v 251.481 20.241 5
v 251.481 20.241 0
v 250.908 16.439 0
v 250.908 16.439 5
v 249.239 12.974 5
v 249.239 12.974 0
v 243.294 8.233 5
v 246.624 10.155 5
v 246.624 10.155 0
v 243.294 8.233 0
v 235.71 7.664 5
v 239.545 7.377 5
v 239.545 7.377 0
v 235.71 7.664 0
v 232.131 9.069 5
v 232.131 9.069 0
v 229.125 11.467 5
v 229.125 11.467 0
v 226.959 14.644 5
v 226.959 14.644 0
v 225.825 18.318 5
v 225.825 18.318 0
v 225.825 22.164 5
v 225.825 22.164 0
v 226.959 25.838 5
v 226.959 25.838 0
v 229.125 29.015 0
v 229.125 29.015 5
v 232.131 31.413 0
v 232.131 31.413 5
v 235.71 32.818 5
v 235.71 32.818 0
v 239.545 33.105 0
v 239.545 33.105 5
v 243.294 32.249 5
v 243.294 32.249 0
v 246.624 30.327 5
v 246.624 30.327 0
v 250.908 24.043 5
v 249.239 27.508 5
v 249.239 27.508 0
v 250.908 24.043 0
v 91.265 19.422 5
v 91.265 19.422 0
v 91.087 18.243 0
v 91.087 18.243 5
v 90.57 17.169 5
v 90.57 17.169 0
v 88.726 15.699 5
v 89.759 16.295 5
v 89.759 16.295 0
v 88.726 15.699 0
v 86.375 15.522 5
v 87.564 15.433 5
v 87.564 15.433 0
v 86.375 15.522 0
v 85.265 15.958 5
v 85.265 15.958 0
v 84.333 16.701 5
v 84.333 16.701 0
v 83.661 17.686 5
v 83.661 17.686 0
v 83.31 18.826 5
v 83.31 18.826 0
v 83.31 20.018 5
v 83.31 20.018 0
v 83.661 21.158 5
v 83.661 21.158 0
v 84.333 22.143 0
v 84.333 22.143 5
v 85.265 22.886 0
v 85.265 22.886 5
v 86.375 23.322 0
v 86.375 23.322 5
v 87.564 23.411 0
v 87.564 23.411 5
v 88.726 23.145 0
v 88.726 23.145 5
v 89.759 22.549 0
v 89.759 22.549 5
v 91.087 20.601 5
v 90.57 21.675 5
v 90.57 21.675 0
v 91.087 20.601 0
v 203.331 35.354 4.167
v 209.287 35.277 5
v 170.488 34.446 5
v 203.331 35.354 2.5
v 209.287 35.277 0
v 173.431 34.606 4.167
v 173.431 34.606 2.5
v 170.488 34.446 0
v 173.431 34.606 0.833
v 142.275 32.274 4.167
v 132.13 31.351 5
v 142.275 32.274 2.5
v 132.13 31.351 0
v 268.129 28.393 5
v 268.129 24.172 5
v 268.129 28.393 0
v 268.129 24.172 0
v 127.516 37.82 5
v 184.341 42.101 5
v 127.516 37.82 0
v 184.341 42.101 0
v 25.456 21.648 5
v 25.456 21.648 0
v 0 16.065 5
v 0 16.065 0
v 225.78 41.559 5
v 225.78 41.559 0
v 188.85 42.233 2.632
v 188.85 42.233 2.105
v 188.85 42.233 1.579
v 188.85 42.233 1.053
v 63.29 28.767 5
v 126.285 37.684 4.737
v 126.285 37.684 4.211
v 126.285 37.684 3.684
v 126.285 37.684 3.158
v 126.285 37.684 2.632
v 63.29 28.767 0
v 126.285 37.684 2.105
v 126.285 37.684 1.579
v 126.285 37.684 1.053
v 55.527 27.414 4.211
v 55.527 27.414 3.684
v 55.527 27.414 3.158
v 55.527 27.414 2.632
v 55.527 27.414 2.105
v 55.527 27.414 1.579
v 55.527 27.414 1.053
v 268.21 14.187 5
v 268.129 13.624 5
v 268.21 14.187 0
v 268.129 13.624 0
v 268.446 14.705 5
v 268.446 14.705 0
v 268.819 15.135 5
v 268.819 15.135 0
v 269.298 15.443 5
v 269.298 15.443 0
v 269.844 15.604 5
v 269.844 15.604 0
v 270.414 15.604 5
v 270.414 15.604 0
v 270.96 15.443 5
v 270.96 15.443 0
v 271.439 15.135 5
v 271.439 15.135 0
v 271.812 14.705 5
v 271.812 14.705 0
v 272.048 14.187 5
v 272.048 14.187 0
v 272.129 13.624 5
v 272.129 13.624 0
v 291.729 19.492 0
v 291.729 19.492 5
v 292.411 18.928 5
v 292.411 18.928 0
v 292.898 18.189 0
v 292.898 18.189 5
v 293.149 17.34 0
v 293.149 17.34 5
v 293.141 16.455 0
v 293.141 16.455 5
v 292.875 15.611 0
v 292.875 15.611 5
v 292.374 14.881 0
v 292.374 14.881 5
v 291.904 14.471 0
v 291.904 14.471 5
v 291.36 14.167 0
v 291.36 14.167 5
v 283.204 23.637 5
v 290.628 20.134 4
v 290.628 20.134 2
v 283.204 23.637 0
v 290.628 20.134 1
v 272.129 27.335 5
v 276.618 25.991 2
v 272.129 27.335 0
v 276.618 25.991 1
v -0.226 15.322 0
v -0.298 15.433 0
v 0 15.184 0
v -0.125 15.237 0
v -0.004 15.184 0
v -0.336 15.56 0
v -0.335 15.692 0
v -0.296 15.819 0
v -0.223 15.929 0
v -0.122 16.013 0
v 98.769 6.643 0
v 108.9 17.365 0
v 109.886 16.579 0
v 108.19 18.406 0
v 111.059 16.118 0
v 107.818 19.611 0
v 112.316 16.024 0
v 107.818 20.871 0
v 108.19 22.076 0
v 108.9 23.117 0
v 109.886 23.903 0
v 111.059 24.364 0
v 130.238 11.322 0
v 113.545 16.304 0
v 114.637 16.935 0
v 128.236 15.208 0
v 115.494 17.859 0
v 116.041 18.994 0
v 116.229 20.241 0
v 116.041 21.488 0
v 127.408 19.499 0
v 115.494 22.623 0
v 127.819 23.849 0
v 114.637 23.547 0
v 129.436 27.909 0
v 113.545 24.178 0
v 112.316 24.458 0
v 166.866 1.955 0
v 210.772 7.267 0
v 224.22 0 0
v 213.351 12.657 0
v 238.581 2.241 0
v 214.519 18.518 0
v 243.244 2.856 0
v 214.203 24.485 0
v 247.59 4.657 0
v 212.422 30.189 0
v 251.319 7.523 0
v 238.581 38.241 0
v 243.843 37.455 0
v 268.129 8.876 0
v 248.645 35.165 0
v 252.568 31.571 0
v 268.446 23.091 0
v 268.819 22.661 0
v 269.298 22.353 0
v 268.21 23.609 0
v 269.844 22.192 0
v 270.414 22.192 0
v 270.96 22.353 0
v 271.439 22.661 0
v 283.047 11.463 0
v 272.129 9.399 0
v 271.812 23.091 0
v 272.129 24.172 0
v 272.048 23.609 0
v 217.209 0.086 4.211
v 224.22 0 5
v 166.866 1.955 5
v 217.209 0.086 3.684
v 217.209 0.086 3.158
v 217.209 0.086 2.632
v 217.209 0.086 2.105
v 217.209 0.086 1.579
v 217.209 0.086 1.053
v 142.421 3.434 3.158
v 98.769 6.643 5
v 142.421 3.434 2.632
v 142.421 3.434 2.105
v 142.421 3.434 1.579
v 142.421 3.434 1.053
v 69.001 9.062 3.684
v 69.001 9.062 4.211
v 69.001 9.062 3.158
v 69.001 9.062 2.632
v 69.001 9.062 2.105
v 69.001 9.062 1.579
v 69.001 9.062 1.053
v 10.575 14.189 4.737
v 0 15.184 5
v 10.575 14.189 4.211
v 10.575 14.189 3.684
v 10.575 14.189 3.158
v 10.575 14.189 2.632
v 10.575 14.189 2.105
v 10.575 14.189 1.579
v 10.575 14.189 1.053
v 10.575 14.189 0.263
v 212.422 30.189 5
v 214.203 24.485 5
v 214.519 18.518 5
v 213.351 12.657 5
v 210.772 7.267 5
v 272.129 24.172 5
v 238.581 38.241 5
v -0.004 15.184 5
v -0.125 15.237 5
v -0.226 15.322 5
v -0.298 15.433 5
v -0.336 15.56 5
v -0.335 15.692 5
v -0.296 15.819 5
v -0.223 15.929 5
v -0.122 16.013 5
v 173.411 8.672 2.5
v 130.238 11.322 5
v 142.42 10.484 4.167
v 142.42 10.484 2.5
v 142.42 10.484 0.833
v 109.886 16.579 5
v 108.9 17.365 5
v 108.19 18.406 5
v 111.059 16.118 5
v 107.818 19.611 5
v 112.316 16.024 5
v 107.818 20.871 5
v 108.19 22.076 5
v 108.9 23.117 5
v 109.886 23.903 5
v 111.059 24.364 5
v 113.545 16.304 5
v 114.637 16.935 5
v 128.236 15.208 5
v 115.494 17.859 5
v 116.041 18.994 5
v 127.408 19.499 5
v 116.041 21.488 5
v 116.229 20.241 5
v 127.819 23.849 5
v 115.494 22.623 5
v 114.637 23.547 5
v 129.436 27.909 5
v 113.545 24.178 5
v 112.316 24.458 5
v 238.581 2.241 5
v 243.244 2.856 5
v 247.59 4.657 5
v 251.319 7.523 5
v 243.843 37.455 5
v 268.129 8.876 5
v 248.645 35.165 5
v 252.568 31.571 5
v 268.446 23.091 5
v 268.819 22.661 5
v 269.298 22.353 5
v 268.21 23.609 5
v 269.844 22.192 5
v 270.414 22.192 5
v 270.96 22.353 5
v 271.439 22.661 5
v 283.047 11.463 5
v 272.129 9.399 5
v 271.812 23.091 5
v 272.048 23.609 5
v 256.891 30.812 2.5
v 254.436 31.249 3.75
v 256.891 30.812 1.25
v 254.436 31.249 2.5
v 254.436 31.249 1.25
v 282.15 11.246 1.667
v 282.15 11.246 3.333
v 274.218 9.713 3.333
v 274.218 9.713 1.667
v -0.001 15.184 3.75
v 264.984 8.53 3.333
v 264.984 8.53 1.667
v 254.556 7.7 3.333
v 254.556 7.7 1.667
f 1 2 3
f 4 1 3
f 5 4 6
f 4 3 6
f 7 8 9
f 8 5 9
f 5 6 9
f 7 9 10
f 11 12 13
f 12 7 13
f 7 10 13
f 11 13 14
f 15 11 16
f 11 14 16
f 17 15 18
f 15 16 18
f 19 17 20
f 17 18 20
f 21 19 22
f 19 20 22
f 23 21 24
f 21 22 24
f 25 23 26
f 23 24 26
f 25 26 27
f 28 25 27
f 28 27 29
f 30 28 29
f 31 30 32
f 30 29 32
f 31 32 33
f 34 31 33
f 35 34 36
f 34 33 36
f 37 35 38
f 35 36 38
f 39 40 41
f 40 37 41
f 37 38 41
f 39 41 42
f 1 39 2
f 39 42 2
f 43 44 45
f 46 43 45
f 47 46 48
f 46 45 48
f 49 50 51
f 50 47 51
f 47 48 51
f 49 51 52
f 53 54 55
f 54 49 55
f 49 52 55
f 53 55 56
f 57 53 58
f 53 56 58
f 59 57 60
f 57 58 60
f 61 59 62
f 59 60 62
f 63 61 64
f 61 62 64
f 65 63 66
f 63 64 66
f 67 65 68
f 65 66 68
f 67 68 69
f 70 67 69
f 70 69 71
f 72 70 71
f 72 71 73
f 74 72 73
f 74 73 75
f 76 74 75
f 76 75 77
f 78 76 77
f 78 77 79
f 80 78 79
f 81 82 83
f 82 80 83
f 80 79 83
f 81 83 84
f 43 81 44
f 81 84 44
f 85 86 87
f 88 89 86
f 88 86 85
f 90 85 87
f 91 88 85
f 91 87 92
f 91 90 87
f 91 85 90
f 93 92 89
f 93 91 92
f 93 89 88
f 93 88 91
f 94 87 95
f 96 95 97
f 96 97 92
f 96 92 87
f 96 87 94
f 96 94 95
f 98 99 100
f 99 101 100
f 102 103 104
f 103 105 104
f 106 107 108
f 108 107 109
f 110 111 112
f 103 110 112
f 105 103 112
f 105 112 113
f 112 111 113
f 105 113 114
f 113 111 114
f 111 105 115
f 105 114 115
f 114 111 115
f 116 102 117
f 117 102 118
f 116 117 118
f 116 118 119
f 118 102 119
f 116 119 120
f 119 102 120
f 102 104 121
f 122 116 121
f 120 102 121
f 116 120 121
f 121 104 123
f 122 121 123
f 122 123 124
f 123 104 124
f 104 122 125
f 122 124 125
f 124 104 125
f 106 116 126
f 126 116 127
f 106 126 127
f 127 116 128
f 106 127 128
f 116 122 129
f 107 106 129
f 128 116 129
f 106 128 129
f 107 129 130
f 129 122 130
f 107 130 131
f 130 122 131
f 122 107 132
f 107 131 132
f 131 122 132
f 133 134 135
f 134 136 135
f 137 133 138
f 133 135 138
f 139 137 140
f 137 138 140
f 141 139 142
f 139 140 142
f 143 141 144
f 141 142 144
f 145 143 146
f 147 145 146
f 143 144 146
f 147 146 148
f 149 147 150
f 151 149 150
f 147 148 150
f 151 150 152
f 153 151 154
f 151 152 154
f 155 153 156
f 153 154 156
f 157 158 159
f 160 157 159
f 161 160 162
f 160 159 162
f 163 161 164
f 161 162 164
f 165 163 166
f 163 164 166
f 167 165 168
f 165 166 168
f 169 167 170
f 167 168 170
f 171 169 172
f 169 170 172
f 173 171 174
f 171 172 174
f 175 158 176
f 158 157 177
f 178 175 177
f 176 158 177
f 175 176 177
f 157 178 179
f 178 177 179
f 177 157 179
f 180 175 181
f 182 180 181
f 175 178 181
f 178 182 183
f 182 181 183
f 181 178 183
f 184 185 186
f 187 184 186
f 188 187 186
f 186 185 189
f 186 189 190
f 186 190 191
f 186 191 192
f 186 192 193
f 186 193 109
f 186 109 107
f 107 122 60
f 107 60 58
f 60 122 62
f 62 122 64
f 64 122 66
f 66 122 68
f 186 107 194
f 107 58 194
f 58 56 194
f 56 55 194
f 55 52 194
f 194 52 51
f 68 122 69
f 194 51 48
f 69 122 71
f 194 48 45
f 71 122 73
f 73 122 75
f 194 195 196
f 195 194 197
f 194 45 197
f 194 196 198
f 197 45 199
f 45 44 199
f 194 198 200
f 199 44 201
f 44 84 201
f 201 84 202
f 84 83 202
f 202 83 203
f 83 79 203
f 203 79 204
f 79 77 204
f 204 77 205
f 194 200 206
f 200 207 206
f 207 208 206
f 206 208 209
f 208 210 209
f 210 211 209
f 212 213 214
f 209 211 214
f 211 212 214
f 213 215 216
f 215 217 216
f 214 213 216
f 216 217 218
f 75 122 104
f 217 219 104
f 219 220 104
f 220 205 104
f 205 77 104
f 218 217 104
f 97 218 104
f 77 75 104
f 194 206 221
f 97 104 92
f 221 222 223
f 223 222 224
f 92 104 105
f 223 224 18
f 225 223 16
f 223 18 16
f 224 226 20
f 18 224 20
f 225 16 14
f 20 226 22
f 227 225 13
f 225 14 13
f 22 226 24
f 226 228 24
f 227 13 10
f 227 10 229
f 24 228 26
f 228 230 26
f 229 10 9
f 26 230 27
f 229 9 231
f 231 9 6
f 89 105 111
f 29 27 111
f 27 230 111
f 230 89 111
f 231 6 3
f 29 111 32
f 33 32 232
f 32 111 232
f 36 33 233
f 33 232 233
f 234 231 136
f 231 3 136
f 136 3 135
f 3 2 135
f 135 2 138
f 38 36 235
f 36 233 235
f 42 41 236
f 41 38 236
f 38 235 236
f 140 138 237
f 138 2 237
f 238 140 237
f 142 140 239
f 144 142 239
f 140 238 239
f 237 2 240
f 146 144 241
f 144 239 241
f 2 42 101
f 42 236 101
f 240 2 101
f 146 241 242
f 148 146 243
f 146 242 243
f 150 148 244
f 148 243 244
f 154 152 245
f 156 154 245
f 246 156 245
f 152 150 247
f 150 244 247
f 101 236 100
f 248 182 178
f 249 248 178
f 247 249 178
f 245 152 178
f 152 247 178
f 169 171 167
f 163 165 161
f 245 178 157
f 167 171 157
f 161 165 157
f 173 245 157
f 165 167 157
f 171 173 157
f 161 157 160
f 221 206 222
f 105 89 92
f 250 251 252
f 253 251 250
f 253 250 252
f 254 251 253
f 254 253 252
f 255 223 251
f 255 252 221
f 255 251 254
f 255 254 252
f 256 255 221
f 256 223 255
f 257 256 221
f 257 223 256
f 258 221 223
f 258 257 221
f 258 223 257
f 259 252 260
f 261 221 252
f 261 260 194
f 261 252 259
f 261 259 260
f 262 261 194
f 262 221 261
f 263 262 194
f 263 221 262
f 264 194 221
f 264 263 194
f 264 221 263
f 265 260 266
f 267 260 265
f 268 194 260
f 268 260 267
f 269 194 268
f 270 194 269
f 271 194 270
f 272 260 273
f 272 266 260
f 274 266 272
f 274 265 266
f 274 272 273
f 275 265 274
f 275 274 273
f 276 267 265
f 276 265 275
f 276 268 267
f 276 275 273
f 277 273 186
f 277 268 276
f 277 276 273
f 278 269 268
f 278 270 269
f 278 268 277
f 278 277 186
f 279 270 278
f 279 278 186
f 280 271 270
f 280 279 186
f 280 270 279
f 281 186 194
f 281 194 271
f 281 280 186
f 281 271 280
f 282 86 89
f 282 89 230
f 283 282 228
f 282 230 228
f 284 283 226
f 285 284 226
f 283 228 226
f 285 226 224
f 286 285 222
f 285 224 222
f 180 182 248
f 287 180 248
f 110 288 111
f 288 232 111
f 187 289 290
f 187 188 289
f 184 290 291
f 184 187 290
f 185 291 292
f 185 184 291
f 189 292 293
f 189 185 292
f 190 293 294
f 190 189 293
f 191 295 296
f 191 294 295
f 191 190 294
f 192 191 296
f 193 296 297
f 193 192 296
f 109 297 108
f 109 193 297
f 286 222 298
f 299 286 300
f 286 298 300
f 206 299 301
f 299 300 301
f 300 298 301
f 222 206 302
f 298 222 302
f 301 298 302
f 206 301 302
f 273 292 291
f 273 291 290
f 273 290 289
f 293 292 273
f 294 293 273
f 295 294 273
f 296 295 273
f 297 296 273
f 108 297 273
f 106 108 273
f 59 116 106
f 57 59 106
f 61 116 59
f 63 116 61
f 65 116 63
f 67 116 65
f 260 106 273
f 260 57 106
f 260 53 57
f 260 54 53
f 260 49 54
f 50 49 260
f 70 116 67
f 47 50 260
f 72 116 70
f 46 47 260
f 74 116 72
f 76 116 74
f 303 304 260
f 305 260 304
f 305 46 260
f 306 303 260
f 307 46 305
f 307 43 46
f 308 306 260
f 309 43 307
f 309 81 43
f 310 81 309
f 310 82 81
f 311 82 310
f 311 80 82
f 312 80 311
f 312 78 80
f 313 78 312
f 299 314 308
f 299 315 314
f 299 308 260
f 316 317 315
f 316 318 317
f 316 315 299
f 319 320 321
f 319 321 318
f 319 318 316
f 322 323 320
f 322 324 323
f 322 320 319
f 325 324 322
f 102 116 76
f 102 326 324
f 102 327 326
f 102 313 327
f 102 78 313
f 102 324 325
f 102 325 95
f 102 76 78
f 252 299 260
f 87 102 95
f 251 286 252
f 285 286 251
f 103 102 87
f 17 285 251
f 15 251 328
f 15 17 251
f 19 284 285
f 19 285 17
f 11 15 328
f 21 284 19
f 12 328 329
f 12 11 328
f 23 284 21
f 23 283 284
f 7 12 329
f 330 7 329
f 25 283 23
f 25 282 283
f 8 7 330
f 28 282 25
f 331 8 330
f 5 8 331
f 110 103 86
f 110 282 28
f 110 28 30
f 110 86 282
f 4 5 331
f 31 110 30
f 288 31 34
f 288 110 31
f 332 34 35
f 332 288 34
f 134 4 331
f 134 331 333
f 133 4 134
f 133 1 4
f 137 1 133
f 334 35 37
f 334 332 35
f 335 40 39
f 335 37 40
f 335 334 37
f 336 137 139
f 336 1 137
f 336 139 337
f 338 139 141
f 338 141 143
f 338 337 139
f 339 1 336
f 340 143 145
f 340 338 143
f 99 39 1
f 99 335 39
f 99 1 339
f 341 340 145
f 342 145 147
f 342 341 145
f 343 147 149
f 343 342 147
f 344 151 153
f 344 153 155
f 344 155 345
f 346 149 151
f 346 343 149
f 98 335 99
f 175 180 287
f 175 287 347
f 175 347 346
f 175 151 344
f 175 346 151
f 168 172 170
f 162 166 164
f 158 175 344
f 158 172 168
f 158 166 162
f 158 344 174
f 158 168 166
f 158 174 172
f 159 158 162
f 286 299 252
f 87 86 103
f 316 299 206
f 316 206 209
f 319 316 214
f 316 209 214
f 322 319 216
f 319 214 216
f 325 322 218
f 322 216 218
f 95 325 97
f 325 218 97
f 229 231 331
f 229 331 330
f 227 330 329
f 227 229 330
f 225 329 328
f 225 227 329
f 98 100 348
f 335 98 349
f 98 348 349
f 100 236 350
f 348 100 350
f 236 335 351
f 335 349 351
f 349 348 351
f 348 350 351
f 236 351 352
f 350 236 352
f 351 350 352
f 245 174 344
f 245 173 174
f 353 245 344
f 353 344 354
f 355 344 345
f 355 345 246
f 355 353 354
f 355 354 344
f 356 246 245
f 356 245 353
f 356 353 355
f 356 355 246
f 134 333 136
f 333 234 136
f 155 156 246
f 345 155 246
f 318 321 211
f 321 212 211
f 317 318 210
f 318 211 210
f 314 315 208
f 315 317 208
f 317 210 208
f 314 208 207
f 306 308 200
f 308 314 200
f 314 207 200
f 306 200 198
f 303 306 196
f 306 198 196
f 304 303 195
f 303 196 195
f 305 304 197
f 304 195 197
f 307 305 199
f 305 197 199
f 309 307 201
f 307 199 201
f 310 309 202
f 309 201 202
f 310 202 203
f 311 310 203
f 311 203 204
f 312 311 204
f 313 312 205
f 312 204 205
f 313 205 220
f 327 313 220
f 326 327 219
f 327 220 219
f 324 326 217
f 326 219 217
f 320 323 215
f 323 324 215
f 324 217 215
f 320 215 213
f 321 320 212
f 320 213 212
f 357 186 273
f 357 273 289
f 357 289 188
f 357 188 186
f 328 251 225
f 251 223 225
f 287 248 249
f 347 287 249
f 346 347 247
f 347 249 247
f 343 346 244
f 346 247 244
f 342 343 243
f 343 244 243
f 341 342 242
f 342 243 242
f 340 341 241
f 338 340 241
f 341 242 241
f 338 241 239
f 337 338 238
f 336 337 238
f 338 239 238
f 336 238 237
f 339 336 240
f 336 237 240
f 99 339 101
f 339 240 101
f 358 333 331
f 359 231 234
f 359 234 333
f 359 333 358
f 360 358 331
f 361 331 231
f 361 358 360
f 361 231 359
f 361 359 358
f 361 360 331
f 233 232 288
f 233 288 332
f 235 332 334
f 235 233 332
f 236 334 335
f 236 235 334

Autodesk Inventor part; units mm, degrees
ref_plane "YZ Plane" through (0, 0, 0) normal (1, 0, 0) x (0, 1, 0)
ref_plane "XZ Plane" through (0, 0, 0) normal (0, 1, 0) x (-1, 0, 0)
ref_plane "XY Plane" through (0, 0, 0) normal (0, 0, 1) x (1, 0, 0)
sketch "Sketch1" plane through (0, 0, 0) normal (0, 0, 1) x (1, 0, 0)
  spline S0 degree 4 poles (254.436054, 38.258138) (252.159915, 38.650332) (246.788709, 39.499265) (237.984874, 40.618279) (225.357478, 41.704285) (211.202741, 42.341661) (196.392584, 42.47009) (181.031283, 42.070233) (165.506388, 41.221743) (149.785249, 40.04478) (134.1096, 38.577548) (118.624688, 36.850842) (103.500036, 34.939301) (88.901638, 32.883406) (74.995754, 30.738214) (61.917783, 28.562704) (49.827113, 26.40977) (38.835364, 24.340018) (29.07721, 22.403865) (20.632296, 20.65644) (13.645605, 19.149082) (6.913163, 17.660714) (2.90218, 16.740022) (0.469137, 16.188187) (0, 16.065) knots 0.21429705 0.21429705 0.21429705 0.21429705 0.21429705 0.2433201 0.28177524 0.32154178 0.36237973 0.40400459 0.44617789 0.48866482 0.5312306 0.57368816 0.61580317 0.65733642 0.6980466 0.73768213 0.77598623 0.81268845 0.84749504 0.88008735 0.91009265 0.93705903 0.9603631 1 1 1 1 1
  spline S1 degree 4 poles (299.999998, 15.624) (299.805651, 13.312974) (297.70854, 10.343184) (293.050897, 7.5008) (285.395888, 4.883043) (278.112378, 3.216454) (269.51472, 1.892454) (259.681019, 0.912997) (248.712883, 0.278332) (236.711867, -0.030891) (223.806667, -0.050368) (210.125319, 0.193333) (195.775416, 0.645033) (180.96771, 1.249367) (165.65166, 1.982539) (150.191633, 2.90484) (134.687258, 3.945111) (119.337536, 5.049498) (104.304232, 6.19869) (89.75661, 7.356132) (75.849241, 8.488651) (62.742943, 9.582403) (50.581067, 10.622604) (39.497088, 11.57965) (29.629376, 12.451281) (21.071247, 13.226368) (13.963939, 13.872105) (7.103576, 14.512622) (2.968279, 14.899676) (0.533018, 15.1397) (-0.004161, 15.184114) knots 0 0 0 0 0 0.05437224 0.07982113 0.10791215 0.1384988 0.1713415 0.2061871 0.24278378 0.28089063 0.3202767 0.36071301 0.4020228 0.44398485 0.4863729 0.52895769 0.5714601 0.61364209 0.65526508 0.6960853 0.73585299 0.77430798 0.81117416 0.84615676 0.87892978 0.90911464 0.93625212 0.9597112 1 1 1 1 1
  arc A0 (0, 16.065) -> (-0.004161, 15.184114) centre (0.115799, 15.624) ccw
  line L0 (0.115799, 15.624) -> (227.990221, 15.624) construction
  line L1 (299.999998, 15.624) -> (0.115799, 15.624) construction
  line L2 (299.999998, 15.624) -> (199.999998, 15.624) construction
  line L3 (199.999998, 15.624) -> (199.999998, 42.37734) construction
  line L4 (199.999998, 15.624) -> (199.999998, 0.52729)
  line L5 (0, 0) -> (0, 20.241)
  line L6 (0, 20.241) -> (238.581, 20.241) construction
  circle A1 centre (238.581, 20.241) radius 14
  line L7 (238.581, 20.241) -> (208.581, 20.241)
  line L8 (238.581, 25.359) -> (238.581, 20.241)
  line L9 (0, 20.241) -> (112, 20.241) construction
  circle A2 centre (112, 20.241) radius 5.39
  line L10 (0, 15.624) -> (112, 15.624) construction
  line L11 (0, 15.624) -> (112, 15.624) construction
  line L12 (112, 15.624) -> (112, 35.994456)
  line L13 (112, 15.624) -> (112, 5.61525)
  spline S2 degree 4 poles (299.285198, 20.241) (299.227939, 20.131643) (299.16804, 20.023225) (299.105573, 19.915754) (299.040612, 19.809235) knots 0 0 0 0 0 1 1 1 1 1
  line L14 (299.207055, 20.082158) -> (298.87417, 19.536312) construction
  arc A3 (298.903999, 19.593162) -> (299.170168, 20.029611) centre (292.291091, 23.925437) ccw construction
  line L15 (299.43203, 20.521431) -> (299.138367, 19.960569) construction
  arc A4 (299.163926, 20.01882) -> (299.398715, 20.467241) centre (292.801001, 23.636075) ccw construction
  spline S3 degree 2 poles (295.850621, 16.559978) (295.157262, 16.069203) (294.393311, 15.624) knots 0 0 0 1 1 1
  line L16 (294.550692, 15.715716) -> (294.235931, 15.532284) construction
  arc A5 (294.267154, 15.551069) -> (294.518956, 15.69781) centre (283.884356, 33.65696) ccw construction
  spline S4 degree 4 poles (296.856901, 15.624) (296.618326, 15.862944) (296.370731, 16.098547) (296.114674, 16.330852) (295.850621, 16.559978) knots 0 0 0 0 0 1 1 1 1 1
  spline S5 degree 4 poles (219.58717, 34.91187) (218.695351, 34.95198) (214.858509, 35.106335) (210.707211, 35.329502) (192.898023, 35.446366) (181.42777, 35.055508) (165.177387, 34.181901) (149.561876, 33.12667) (133.828431, 31.347909) (128.265438, 31.097419) (123.390775, 30.590026) knots 0 0 0 0 0 0.13924435 0.23321956 0.36393672 0.50998276 0.65711487 0.7981047 1 1 1 1 1
  line L17 (295.959293, 16.465681) -> (295.74195, 16.654276) construction
  arc A6 (295.937354, 16.484307) -> (295.763482, 16.635181) centre (281.87292, 0.451609) ccw construction
  line L18 (232.743774, 34.364452) -> (201.193566, 35.681454) construction
  arc A7 (229.586762, 34.454933) -> (204.347135, 35.508511) centre (136.348344, -1896.324468) ccw construction
  arc A8 (264.266057, 15.123) -> (264.360826, 15.624) centre (238.581, 20.241) ccw
  circle A9 centre (238.581, 20.241) radius 24
  circle A10 centre (112, 20.241) radius 15.39
  spline S6 degree 4 poles (299.999998, 15.624) (300.269142, 17.933652) (298.783415, 21.267693) (294.693448, 24.979847) (287.53174, 28.940551) (280.486947, 31.820538) (271.480983, 34.718213) (262.486804, 36.793013) (257.700386, 37.695672) (254.436054, 38.258138) knots 0 0 0 0 0 0.24755477 0.36385739 0.4925498 0.63299607 0.77826439 1 1 1 1 1
  line L19 (285.294543, 32.941011) -> (223.577565, 43.575266) construction
  arc A11 (278.722442, 32.634865) -> (229.668212, 41.087243) centre (217.218351, -177.738587) ccw construction
  line L20 (285.294543, 32.941011) -> (223.577565, 43.575266) construction
  arc A12 (278.877125, 33.041766) -> (229.658629, 41.522447) centre (200.894914, -272.473312) ccw construction
  spline S7 degree 4 poles (251.493, 31.73616) (243.700929, 32.967588) (232.160237, 34.296592) (216.442824, 35.287928) (196.392341, 35.461091) (181.031705, 35.061513) (165.505292, 34.212684) (149.788285, 33.036509) (134.101234, 31.567156) (118.647366, 29.846206) (103.439709, 27.919279) (89.058912, 25.903716) (74.837064, 23.692714) (62.488433, 21.669546) (49.639937, 19.354465) (46.379459, 18.742869) (43.812536, 18.259032) knots 0 0 0 0 0 0.1639631 0.23233838 0.3020312 0.37264227 0.44377843 0.51504665 0.58613365 0.65664712 0.72618654 0.7943479 0.86070997 0.92034602 1 1 1 1 1 construction
  spline S8 degree 4 poles (295.845009, 16.556007) (295.719822, 16.664559) (294.584958, 17.628339) (292.058546, 19.428263) (287.516704, 21.93465) (280.467029, 24.832118) (271.97142, 27.522599) (264.208658, 29.400369) (258.409244, 30.551465) (255.053616, 31.142888) (254.436054, 31.249298) (253.968946, 31.329784) (253.501839, 31.41027) (253.034731, 31.490756) (252.567623, 31.571241) knots 0 0 0 0 0 0.01890503 0.16895946 0.33499927 0.51620401 0.71116085 0.9183366 0.96483207 0.96483207 0.96483207 0.96483207 1 1 1 1 1
  line L21 (285.294543, 25.932171) -> (223.577565, 36.566425) construction
  line L22 (285.294543, 25.932171) -> (223.577565, 36.566425) construction
  arc A13 (278.722442, 25.626025) -> (229.668212, 34.078402) centre (217.218351, -184.747428) ccw construction
  line L23 (270.129, 9.125374) -> (275.129, 9.125374) construction
  line L24 (281.07, 24.45816) -> (286.07, 24.45816) construction
  line L25 (318.821413, -3.367269) -> (272.868604, 36.479282) construction
  arc A14 (303.207925, 0.551953) -> (278.959518, 21.578206) centre (281.857648, 0.425162) ccw construction
  spline S9 degree 4 poles (295.835285, 16.564433) (293.417091, 14.88464) (288.41352, 12.692641) (280.70627, 10.669821) (269.511023, 8.939829) (259.682627, 7.96324) (248.712204, 7.32734) (236.712148, 7.018633) (223.806545, 6.998947) (210.125394, 7.242728) (195.775305, 7.694406) (180.967993, 8.298721) (165.65086, 9.03198) (150.193891, 9.954022) (134.681006, 10.995018) (119.354518, 12.097424) (104.258979, 13.251926) (89.874814, 14.39542) (75.752353, 15.547068) (62.906491, 16.616479) (50.510696, 17.677636) (46.516568, 18.024605) (43.812536, 18.259032) knots 0 0 0 0 0 0.08476672 0.12402522 0.16617938 0.21090431 0.25787677 0.30678758 0.35734028 0.40924097 0.46226281 0.51612182 0.5705276 0.62518592 0.67973848 0.7338798 0.78730362 0.83969707 0.89073959 0.93714265 1 1 1 1 1
  spline S10 degree 4 poles (21.462276, 20.241) (20.622656, 20.316984) (20.124028, 20.362207) (19.919133, 20.380856) (19.554048, 20.414029) knots 0 0 0 0 0 1 1 1 1 1 construction
  line L26 (68.488377, 16.119755) -> (19.136695, 20.398308) construction
  arc A15 (63.551474, 16.528056) -> (24.070206, 19.950891) centre (-819.899413, -9944.371227) ccw construction
  line L27 (21.724437, 20.217275) -> (21.200116, 20.264725) construction
  arc A16 (21.252548, 20.259982) -> (21.672005, 20.222022) centre (898.635849, 9712.955601) ccw construction
  line L28 (74.254065, 23.996937) -> (13.371006, 12.521126) construction
  arc A17 (68.175943, 22.793945) -> (19.469999, 13.613391) centre (1053.390082, -5337.891027) ccw construction
  spline S11 degree 4 poles (218.437499, 7.193419) (217.617295, 7.240848) (213.819214, 7.468804) (209.586315, 6.850678) (192.548492, 7.944114) (181.146901, 8.16297) (165.746092, 9.02826) (149.142366, 9.880106) (139.977668, 10.751942) (129.107316, 11.246393) (124.68665, 11.528881) knots 0 0 0 0 0 0.12763083 0.21372336 0.33362841 0.4674456 0.60262129 0.73842442 0.88039529 0.88039529 0.88039529 0.88039529 0.88039529
  line L29 (133.533683, 10.96354) -> (115.839617, 12.094223) construction
  arc A18 (117.617989, 12.078874) -> (131.767822, 11.174674) centre (141.026952, 267.238396) ccw construction
  line L30 (140.664975, 32.388062) -> (106.116576, 28.79199) construction
  arc A19 (137.221962, 31.449676) -> (109.679039, 28.58279) centre (140.622493, -134.959578) ccw construction
  circle A20 centre (238.581, 20.241) radius 18
  line L31 (238.581, 38.241) -> (225.78, 41.559)
  line L32 (238.581, 2.241) -> (224.22, 0)
  line L33 (214.581, 20.241) -> (214.581, 42.126574) construction
  line L34 (127.39, 20.241) -> (127.39, 11.525517) construction
  line L35 (127.39, 20.241) -> (131.31394, 20.241) construction
  line L36 (96.61, 20.241) -> (96.61, 13.863077) construction
  line L37 (270.129, 5.61525) -> (270.129, 15.624) construction
  line L38 (272.129, 7.61525) -> (272.129, 13.624)
  line L39 (268.129, 13.624) -> (268.129, 7.61525)
  arc A21 (268.129, 7.61525) -> (272.129, 7.61525) centre (270.129, 7.61525) ccw
  arc A22 (272.129, 13.624) -> (268.129, 13.624) centre (270.129, 13.624) ccw
  line L40 (270.129, 32.18075) -> (270.129, 22.172) construction
  line L41 (272.129, 30.18075) -> (272.129, 24.172)
  line L42 (268.129, 24.172) -> (268.129, 30.18075)
  arc A23 (272.129, 30.18075) -> (268.129, 30.18075) centre (270.129, 30.18075) ccw
  arc A24 (268.129, 24.172) -> (272.129, 24.172) centre (270.129, 24.172) ccw
  arc A25 (199.999998, 42.31547) -> (199.853854, 42.377258) centre (190.581, 20.241) ccw
  arc A26 (171.272979, 34.495835) -> (171.268099, 34.489223) centre (190.581, 20.241) ccw
  arc A27 (210.748391, 7.230376) -> (209.287499, 35.276521) centre (190.581, 20.241) ccw
  arc A28 (169.44554, 8.870309) -> (169.474435, 8.816763) centre (190.581, 20.241) ccw
  arc A29 (153.976817, 9.682431) -> (154.030254, 9.739387) centre (142.78, 20.241) ccw
  arc A30 (151.241916, 33.095886) -> (151.219343, 33.110716) centre (142.78, 20.241) ccw
  arc A31 (132.12991, 31.350801) -> (130.322928, 11.203663) centre (142.78, 20.241) ccw
  arc A32 (95.274104, 13.969298) -> (95.169771, 26.74146) centre (81.22, 20.241) ccw
  arc A33 (66.333989, 16.334751) -> (66.538876, 15.624) centre (81.22, 20.241) ccw
  line L43 (112, 20.241) -> (112, 14.851) construction
  line L44 (112, 14.851) -> (87.265, 19.422) construction
  circle A34 centre (87.265, 19.422) radius 4
  circle A35 centre (238.581, 20.241) radius 12.9
  circle A36 centre (112, 20.241) radius 4.229
  point P0 (0.783, 16.254)
  point P1 (3.213, 16.812)
  point P2 (7.239, 17.724)
  point P3 (12.813, 18.96)
  point P4 (19.884, 20.484)
  point P5 (28.374, 22.245)
  point P6 (38.199, 24.195)
  point P7 (49.254, 26.28)
  point P8 (61.419, 28.446)
  point P9 (74.571, 30.636)
  point P10 (88.56, 32.793)
  point P11 (103.242, 34.86)
  point P12 (118.455, 36.783)
  point P13 (134.028, 38.511)
  point P14 (149.793, 39.984)
  point P15 (165.576, 41.16)
  point P16 (181.206, 41.985)
  point P17 (196.638, 42.363)
  point P18 (211.554, 42.222)
  point P19 (239.145, 40.389)
  point P20 (262.68, 36.666)
  point P21 (272.577, 34.218)
  point P22 (281.07, 31.467)
  point P23 (288.069, 28.491)
  point P24 (293.505, 25.359)
  point P25 (297.324, 22.137)
  point P26 (300, 15.624)
  point P27 (0.861, 15.105)
  point P28 (3.342, 14.868)
  point P29 (7.446, 14.481)
  point P30 (13.122, 13.953)
  point P31 (20.31, 13.296)
  point P32 (28.92, 12.519)
  point P33 (38.856, 11.64)
  point P34 (50.007, 10.674)
  point P35 (62.244, 9.63)
  point P36 (75.429, 8.529)
  point P37 (89.418, 7.389)
  point P38 (104.052, 6.228)
  point P39 (119.172, 5.076)
  point P40 (134.613, 3.966)
  point P41 (150.207, 2.928)
  point P42 (165.783, 2.013)
  point P43 (181.167, 1.263)
  point P44 (196.068, 0.663)
  point P45 (210.468, 0.225)
  point P46 (237.189, 0.039)
  point P47 (249.246, 0.378)
  point P48 (260.262, 1.05)
  point P49 (270.129, 2.076)
  point P50 (278.739, 3.462)
  point P51 (285.993, 5.211)
  point P52 (291.81, 7.314)
  point P53 (296.121, 9.756)
  point P54 (298.863, 12.531)
  point P55 (199.999998, 15.624)
  point P56 (225.364219, 15.624)
  point P57 (238.581, 6.241)
  point P58 (238.581, 34.241)
  point P59 (225.364219, 15.624)
  point P60 (251.797781, 15.624)
  point P61 (0, 16.065)
  point P62 (0, 15.183769)
  point P63 (224.581, 20.241)
  point P64 (112, 25.631)
  point P65 (0, 9.065)
  point P66 (0.783, 9.254)
  point P67 (3.213, 9.812)
  point P68 (7.239, 10.724)
  point P69 (12.813, 11.96)
  point P70 (19.884, 13.484)
  point P71 (28.374, 15.245)
  point P72 (38.199, 17.195)
  point P73 (49.254, 19.28)
  point P74 (61.419, 21.446)
  point P75 (74.571, 23.636)
  point P76 (88.56, 25.793)
  point P77 (103.242, 27.86)
  point P78 (118.455, 29.783)
  point P79 (134.028, 31.511)
  point P80 (149.793, 32.984)
  point P81 (165.576, 34.16)
  point P82 (181.206, 34.985)
  point P83 (225.78, 34.559)
  point P84 (239.145, 33.389)
  point P85 (251.493, 31.745)
  point P86 (262.68, 29.666)
  point P87 (272.577, 27.218)
  point P88 (281.07, 24.467)
  point P89 (288.069, 21.491)
  point P90 (293.505, 18.359)
  point P91 (297.324, 15.137)
  point P92 (299.493, 11.879)
  point P93 (300, 8.624)
  point P94 (-0.004161, 22.184114)
  point P95 (0.861, 22.105)
  point P96 (3.342, 21.868)
  point P97 (7.446, 21.481)
  point P98 (13.122, 20.953)
  point P99 (20.31, 20.296)
  point P100 (28.92, 19.519)
  point P101 (38.856, 18.64)
  point P102 (50.007, 17.674)
  point P103 (62.244, 16.63)
  point P104 (75.429, 15.529)
  point P105 (89.418, 14.389)
  point P106 (104.052, 13.228)
  point P107 (119.172, 12.076)
  point P108 (134.613, 10.966)
  point P109 (150.207, 9.928)
  point P110 (165.783, 9.013)
  point P111 (181.167, 8.263)
  point P112 (196.068, 7.663)
  point P113 (210.468, 7.225)
  point P114 (224.22, 7)
  point P115 (237.189, 7.039)
  point P116 (249.246, 7.378)
  point P117 (260.262, 8.05)
  point P118 (270.129, 9.076)
  point P119 (278.739, 10.462)
  point P120 (285.993, 12.211)
  point P121 (291.81, 14.314)
  point P122 (296.121, 16.756)
  point P123 (298.863, 19.531)
  point P124 (300, 22.624)
  point P125 (18.740477, 20.241)
  point P126 (216.96867, 35.022953)
  point P127 (0, 16.065)
  point P128 (296.856901, 15.624)
  point P129 (294.393311, 15.624)
  point P130 (219.58717, 34.91187)
  point P131 (123.390775, 30.590026)
  point P132 (254.436054, 38.258138)
  point P133 (0, 9.05616)
  point P134 (0.783, 9.24516)
  point P135 (3.213, 9.80316)
  point P136 (7.239, 10.71516)
  point P137 (12.813, 11.95116)
  point P138 (19.884, 13.47516)
  point P139 (28.374, 15.23616)
  point P140 (38.199, 17.18616)
  point P141 (49.254, 19.27116)
  point P142 (61.419, 21.43716)
  point P143 (74.571, 23.62716)
  point P144 (88.56, 25.78416)
  point P145 (103.242, 27.85116)
  point P146 (118.455, 29.77416)
  point P147 (134.028, 31.50216)
  point P148 (149.793, 32.97516)
  point P149 (165.576, 34.15116)
  point P150 (181.206, 34.97616)
  point P151 (196.638, 35.35416)
  point P152 (211.554, 35.21316)
  point P153 (225.78, 34.55016)
  point P154 (262.68, 29.65716)
  point P155 (272.577, 27.20916)
  point P156 (297.324, 15.12816)
  point P157 (299.493, 11.87016)
  point P158 (300, 8.61516)
  point P159 (254.436054, 31.249298)
  point P160 (216.884838, -206.362485)
  point P161 (278.876889, 26.073396)
  point P162 (229.590604, 33.866167)
  point P163 (-0.004161, 22.233488)
  point P164 (0.861, 22.154374)
  point P165 (3.342, 21.917374)
  point P166 (7.446, 21.530374)
  point P167 (13.122, 21.002374)
  point P168 (28.92, 19.568374)
  point P169 (38.856, 18.689374)
  point P170 (50.007, 17.723374)
  point P171 (62.244, 16.679374)
  point P172 (75.429, 15.578374)
  point P173 (89.418, 14.438374)
  point P174 (104.052, 13.277374)
  point P175 (119.172, 12.125374)
  point P176 (134.613, 11.015374)
  point P177 (150.207, 9.977374)
  point P178 (165.783, 9.062374)
  point P179 (181.167, 8.312374)
  point P180 (196.068, 7.712374)
  point P181 (210.468, 7.274374)
  point P182 (224.22, 7.049374)
  point P183 (237.189, 7.088374)
  point P184 (249.246, 7.427374)
  point P185 (260.262, 8.099374)
  point P186 (278.739, 10.511374)
  point P187 (285.993, 12.260374)
  point P188 (296.121, 16.805374)
  point P189 (298.863, 19.580374)
  point P190 (300, 22.673374)
  point P191 (225.700031, -0.009448)
  point P192 (252.261653, 0.521981)
  point P193 (227.349521, 41.450759)
  point P194 (105.977751, 6.07821)
  point P195 (115.800844, 5.327728)
  point P196 (98.259993, 27.173842)
  point P197 (260.452219, 30.122789)
  point P198 (123.585295, 30.371797)
  point P199 (134.59788, 31.560388)
  dimension "d38" = 10.78
  dimension "d17" = 100
  dimension "d19" = 20.241
  dimension "d20" = 238.581
  dimension "d21" = 28
  dimension "d37" = 112
  dimension "d39" = 112
  dimension "d40" = 0
  dimension "d43" = 10
  dimension "d44" = 10
  dimension "d55" = 4
  dimension "d56" = 90
  dimension "d58" = 4
  dimension "d60" = 8
  dimension "d62" = 0.819
  dimension "d63" = 24.735
  dimension "d65" = 25.8
  dimension "d66" = 8.458
sketch "Sketch1 outline for Extrusion3" plane through (0, 0, 0) normal (0, 0, 1) x (1, 0, 0)
  spline S0 degree 4 poles (0, 15.183769) (-0.001046, 15.183856) (-0.002088, 15.183942) (-0.003126, 15.184028) (-0.004161, 15.184114) knots 0 0 0 0 0 1 1 1 1 1
  spline S1 degree 4 poles (224.22, 0) (222.479951, 0.013004) (217.292297, 0.069187) (208.469243, 0.245463) (195.775416, 0.645033) (180.96771, 1.249367) (165.65166, 1.982539) (150.191633, 2.90484) (134.687258, 3.945111) (119.337536, 5.049498) (104.304232, 6.19869) (89.75661, 7.356132) (75.849241, 8.488651) (62.742943, 9.582403) (50.581067, 10.622604) (39.497088, 11.57965) (29.629376, 12.451281) (21.071247, 13.226368) (13.963939, 13.872105) (7.107973, 14.512211) (2.97534, 14.899015) (0.541913, 15.138823) (0, 15.183769) knots 0 0 0 0 0 0.02936819 0.08711706 0.14611338 0.20604122 0.26657745 0.32739466 0.3880942 0.44833615 0.50777977 0.56607692 0.6228709 0.67779016 0.73044036 0.78040055 0.82720513 0.87031346 0.90906968 0.94257262 1 1 1 1 1
  line L0 (224.22, 0) -> (238.581, 2.241)
  arc A0 (238.581, 2.241) -> (251.319332, 7.523497) centre (238.581, 20.241) ccw
  spline S2 degree 4 poles (268.129, 8.876482) (267.350973, 8.784165) (264.070152, 8.41388) (259.922783, 8.03946) (255.648904, 7.749196) (252.134203, 7.563785) (251.319332, 7.523497) knots 0 0 0 0 0 0.19446677 0.81409157 1 1 1 1 1
  line L1 (268.129, 8.876482) -> (268.129, 13.624)
  arc A1 (268.129, 13.624) -> (272.129, 13.624) centre (270.129, 13.624) cw
  line L2 (272.129, 13.624) -> (272.129, 9.39886)
  spline S3 degree 4 poles (295.835285, 16.564433) (293.417091, 14.88464) (288.41352, 12.692641) (282.206639, 11.063603) (275.277329, 9.862415) (272.65595, 9.474358) (272.129, 9.39886) knots 0 0 0 0 0 0.63339451 0.92674211 1 1 1 1 1
  spline S4 degree 4 poles (295.835285, 16.564433) (295.712426, 16.670837) (294.579422, 17.632282) (292.055318, 19.430045) (287.516704, 21.93465) (281.462074, 24.423147) (276.515305, 26.06668) (273.276333, 27.014249) (272.129, 27.335374) knots 0 0 0 0 0 0.03023743 0.27499105 0.54581841 0.84138126 1 1 1 1 1
  line L3 (272.129, 27.335374) -> (272.129, 24.172)
  arc A2 (272.129, 24.172) -> (268.129, 24.172) centre (270.129, 24.172) cw
  line L4 (268.129, 24.172) -> (268.129, 28.393044)
  spline S5 degree 4 poles (268.129, 28.393044) (267.95313, 28.436967) (265.243797, 29.109201) (261.874729, 29.863619) (258.409244, 30.551465) (255.053616, 31.142888) (254.436054, 31.249298) (253.968946, 31.329784) (253.501839, 31.41027) (253.034731, 31.490756) (252.567623, 31.571241) knots 0 0 0 0 0 0.04751866 0.73070527 0.88402957 0.88402957 0.88402957 0.88402957 1 1 1 1 1
  arc A3 (252.567623, 31.571241) -> (238.581, 38.241) centre (238.581, 20.241) ccw
  line L5 (238.581, 38.241) -> (225.78, 41.559)
  spline S6 degree 4 poles (225.78, 41.559) (223.981701, 41.678798) (218.618296, 41.998081) (209.491978, 42.356496) (196.392584, 42.47009) (181.031283, 42.070233) (165.506388, 41.221743) (149.785249, 40.04478) (134.1096, 38.577548) (118.624688, 36.850842) (103.500036, 34.939301) (88.901638, 32.883406) (74.995754, 30.738214) (61.917783, 28.562704) (49.827113, 26.40977) (38.835364, 24.340018) (29.07721, 22.403865) (20.632296, 20.65644) (13.645605, 19.149082) (6.913163, 17.660714) (2.90218, 16.740022) (0.469137, 16.188187) (0, 16.065) knots 0 0 0 0 0 0.02971241 0.08811623 0.14764545 0.20795901 0.26872109 0.32959596 0.39031605 0.45054625 0.50994444 0.56816554 0.62484975 0.67962982 0.73211898 0.78189715 0.82850859 0.87142025 0.90998584 0.94331385 1 1 1 1 1
  arc A4 (0, 16.065) -> (-0.004161, 15.184114) centre (0.115799, 15.624) ccw
  arc A5 (130.237617, 11.322439) -> (132.12991, 31.350801) centre (142.78, 20.241) cw
  spline S7 degree 4 poles (209.287499, 35.276521) (208.016254, 35.302234) (203.394539, 35.374392) (192.107099, 35.419415) (181.42777, 35.055508) (165.177387, 34.181901) (152.027787, 33.293306) (140.12289, 32.036547) (134.373831, 31.53661) (132.12991, 31.350801) knots 0 0 0 0 0 0.08041067 0.26080902 0.46236226 0.66541434 0.85998968 1 1 1 1 1
  arc A6 (209.287499, 35.276521) -> (210.772015, 7.267069) centre (190.581, 20.241) cw
  spline S8 degree 4 poles (210.772015, 7.267069) (208.879361, 7.312262) (203.376792, 7.457482) (194.11369, 7.76222) (180.967993, 8.298721) (165.65086, 9.03198) (151.022109, 9.904617) (140.198122, 10.625231) (133.276252, 11.107079) (130.237617, 11.322439) knots 0 0 0 0 0 0.09754364 0.2824031 0.47018137 0.65986596 0.85043099 1 1 1 1 1
  circle A7 centre (87.265, 19.422) radius 4
  circle A8 centre (112, 20.241) radius 4.229
  circle A9 centre (238.581, 20.241) radius 12.9
extrude "Extrusion3" add sketch "Sketch1 outline for Extrusion3" along normal blind 5
fillet "Fillet3" radius 3 1 edges at (295.8353, 16.5644, 2.5)
properties part number "R9 Foam"
